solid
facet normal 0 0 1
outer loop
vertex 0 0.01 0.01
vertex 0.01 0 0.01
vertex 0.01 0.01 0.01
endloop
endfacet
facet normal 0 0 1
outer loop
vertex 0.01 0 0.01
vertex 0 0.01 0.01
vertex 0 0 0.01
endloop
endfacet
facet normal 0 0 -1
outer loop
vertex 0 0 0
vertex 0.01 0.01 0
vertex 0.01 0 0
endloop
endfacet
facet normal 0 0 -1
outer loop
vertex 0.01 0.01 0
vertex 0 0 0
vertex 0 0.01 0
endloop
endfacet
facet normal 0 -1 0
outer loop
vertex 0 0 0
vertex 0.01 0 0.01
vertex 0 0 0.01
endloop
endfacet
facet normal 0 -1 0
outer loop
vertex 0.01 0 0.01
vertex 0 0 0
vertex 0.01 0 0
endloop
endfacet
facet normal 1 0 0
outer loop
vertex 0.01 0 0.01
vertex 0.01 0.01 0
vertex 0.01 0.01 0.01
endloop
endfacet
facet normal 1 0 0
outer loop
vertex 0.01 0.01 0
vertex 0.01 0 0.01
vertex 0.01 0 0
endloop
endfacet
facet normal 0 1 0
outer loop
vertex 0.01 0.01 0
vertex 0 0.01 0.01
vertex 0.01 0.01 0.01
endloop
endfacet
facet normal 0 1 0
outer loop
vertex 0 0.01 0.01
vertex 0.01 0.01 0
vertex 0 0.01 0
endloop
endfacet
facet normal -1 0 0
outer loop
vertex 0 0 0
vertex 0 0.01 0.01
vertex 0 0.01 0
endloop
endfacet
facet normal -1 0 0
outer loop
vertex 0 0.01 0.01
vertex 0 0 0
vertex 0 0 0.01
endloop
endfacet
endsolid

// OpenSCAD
/***
 * @function tooth_placement_assembly_ownership
 * @brief Preserve missing and duplicate tooth detection using exposed tops as root unions hide internal splice points.
 * Source: [`tooth/placement/assembly_ownership.scad`](tooth/placement/assembly_ownership.scad)
 */
include <../../../src/circle/base.scad>
state=_cg_tooth_geometry_state(_cg_circle_points(.8,34,120),.8,34,20,0,false,undef,undef,false,true);
outline=state[7];placements=state[5];
witness=placements[7][6][len(placements[7][5][4])-1];
missing=[for(point=outline) if(_cg_vlen(point-witness)>_cg_eps_len()) point];
duplicate=concat([witness],outline);
assert(len(_cg_assembled_component_failures(outline,placements,state[12]))==0);
assert(len([for(f=_cg_assembled_component_failures(missing,placements,state[12])) if(f[0]=="MERGE_MISSING_TOOTH" && f[1]==7) 1])==1);
assert(len([for(f=_cg_assembled_component_failures(duplicate,placements,state[12])) if(f[0]=="MERGE_DUPLICATE_TOOTH" && f[1]==7) 1])==1);
echo("PASS: missing and duplicate exposed tooth ownership remain enforced");
cube(.01);
